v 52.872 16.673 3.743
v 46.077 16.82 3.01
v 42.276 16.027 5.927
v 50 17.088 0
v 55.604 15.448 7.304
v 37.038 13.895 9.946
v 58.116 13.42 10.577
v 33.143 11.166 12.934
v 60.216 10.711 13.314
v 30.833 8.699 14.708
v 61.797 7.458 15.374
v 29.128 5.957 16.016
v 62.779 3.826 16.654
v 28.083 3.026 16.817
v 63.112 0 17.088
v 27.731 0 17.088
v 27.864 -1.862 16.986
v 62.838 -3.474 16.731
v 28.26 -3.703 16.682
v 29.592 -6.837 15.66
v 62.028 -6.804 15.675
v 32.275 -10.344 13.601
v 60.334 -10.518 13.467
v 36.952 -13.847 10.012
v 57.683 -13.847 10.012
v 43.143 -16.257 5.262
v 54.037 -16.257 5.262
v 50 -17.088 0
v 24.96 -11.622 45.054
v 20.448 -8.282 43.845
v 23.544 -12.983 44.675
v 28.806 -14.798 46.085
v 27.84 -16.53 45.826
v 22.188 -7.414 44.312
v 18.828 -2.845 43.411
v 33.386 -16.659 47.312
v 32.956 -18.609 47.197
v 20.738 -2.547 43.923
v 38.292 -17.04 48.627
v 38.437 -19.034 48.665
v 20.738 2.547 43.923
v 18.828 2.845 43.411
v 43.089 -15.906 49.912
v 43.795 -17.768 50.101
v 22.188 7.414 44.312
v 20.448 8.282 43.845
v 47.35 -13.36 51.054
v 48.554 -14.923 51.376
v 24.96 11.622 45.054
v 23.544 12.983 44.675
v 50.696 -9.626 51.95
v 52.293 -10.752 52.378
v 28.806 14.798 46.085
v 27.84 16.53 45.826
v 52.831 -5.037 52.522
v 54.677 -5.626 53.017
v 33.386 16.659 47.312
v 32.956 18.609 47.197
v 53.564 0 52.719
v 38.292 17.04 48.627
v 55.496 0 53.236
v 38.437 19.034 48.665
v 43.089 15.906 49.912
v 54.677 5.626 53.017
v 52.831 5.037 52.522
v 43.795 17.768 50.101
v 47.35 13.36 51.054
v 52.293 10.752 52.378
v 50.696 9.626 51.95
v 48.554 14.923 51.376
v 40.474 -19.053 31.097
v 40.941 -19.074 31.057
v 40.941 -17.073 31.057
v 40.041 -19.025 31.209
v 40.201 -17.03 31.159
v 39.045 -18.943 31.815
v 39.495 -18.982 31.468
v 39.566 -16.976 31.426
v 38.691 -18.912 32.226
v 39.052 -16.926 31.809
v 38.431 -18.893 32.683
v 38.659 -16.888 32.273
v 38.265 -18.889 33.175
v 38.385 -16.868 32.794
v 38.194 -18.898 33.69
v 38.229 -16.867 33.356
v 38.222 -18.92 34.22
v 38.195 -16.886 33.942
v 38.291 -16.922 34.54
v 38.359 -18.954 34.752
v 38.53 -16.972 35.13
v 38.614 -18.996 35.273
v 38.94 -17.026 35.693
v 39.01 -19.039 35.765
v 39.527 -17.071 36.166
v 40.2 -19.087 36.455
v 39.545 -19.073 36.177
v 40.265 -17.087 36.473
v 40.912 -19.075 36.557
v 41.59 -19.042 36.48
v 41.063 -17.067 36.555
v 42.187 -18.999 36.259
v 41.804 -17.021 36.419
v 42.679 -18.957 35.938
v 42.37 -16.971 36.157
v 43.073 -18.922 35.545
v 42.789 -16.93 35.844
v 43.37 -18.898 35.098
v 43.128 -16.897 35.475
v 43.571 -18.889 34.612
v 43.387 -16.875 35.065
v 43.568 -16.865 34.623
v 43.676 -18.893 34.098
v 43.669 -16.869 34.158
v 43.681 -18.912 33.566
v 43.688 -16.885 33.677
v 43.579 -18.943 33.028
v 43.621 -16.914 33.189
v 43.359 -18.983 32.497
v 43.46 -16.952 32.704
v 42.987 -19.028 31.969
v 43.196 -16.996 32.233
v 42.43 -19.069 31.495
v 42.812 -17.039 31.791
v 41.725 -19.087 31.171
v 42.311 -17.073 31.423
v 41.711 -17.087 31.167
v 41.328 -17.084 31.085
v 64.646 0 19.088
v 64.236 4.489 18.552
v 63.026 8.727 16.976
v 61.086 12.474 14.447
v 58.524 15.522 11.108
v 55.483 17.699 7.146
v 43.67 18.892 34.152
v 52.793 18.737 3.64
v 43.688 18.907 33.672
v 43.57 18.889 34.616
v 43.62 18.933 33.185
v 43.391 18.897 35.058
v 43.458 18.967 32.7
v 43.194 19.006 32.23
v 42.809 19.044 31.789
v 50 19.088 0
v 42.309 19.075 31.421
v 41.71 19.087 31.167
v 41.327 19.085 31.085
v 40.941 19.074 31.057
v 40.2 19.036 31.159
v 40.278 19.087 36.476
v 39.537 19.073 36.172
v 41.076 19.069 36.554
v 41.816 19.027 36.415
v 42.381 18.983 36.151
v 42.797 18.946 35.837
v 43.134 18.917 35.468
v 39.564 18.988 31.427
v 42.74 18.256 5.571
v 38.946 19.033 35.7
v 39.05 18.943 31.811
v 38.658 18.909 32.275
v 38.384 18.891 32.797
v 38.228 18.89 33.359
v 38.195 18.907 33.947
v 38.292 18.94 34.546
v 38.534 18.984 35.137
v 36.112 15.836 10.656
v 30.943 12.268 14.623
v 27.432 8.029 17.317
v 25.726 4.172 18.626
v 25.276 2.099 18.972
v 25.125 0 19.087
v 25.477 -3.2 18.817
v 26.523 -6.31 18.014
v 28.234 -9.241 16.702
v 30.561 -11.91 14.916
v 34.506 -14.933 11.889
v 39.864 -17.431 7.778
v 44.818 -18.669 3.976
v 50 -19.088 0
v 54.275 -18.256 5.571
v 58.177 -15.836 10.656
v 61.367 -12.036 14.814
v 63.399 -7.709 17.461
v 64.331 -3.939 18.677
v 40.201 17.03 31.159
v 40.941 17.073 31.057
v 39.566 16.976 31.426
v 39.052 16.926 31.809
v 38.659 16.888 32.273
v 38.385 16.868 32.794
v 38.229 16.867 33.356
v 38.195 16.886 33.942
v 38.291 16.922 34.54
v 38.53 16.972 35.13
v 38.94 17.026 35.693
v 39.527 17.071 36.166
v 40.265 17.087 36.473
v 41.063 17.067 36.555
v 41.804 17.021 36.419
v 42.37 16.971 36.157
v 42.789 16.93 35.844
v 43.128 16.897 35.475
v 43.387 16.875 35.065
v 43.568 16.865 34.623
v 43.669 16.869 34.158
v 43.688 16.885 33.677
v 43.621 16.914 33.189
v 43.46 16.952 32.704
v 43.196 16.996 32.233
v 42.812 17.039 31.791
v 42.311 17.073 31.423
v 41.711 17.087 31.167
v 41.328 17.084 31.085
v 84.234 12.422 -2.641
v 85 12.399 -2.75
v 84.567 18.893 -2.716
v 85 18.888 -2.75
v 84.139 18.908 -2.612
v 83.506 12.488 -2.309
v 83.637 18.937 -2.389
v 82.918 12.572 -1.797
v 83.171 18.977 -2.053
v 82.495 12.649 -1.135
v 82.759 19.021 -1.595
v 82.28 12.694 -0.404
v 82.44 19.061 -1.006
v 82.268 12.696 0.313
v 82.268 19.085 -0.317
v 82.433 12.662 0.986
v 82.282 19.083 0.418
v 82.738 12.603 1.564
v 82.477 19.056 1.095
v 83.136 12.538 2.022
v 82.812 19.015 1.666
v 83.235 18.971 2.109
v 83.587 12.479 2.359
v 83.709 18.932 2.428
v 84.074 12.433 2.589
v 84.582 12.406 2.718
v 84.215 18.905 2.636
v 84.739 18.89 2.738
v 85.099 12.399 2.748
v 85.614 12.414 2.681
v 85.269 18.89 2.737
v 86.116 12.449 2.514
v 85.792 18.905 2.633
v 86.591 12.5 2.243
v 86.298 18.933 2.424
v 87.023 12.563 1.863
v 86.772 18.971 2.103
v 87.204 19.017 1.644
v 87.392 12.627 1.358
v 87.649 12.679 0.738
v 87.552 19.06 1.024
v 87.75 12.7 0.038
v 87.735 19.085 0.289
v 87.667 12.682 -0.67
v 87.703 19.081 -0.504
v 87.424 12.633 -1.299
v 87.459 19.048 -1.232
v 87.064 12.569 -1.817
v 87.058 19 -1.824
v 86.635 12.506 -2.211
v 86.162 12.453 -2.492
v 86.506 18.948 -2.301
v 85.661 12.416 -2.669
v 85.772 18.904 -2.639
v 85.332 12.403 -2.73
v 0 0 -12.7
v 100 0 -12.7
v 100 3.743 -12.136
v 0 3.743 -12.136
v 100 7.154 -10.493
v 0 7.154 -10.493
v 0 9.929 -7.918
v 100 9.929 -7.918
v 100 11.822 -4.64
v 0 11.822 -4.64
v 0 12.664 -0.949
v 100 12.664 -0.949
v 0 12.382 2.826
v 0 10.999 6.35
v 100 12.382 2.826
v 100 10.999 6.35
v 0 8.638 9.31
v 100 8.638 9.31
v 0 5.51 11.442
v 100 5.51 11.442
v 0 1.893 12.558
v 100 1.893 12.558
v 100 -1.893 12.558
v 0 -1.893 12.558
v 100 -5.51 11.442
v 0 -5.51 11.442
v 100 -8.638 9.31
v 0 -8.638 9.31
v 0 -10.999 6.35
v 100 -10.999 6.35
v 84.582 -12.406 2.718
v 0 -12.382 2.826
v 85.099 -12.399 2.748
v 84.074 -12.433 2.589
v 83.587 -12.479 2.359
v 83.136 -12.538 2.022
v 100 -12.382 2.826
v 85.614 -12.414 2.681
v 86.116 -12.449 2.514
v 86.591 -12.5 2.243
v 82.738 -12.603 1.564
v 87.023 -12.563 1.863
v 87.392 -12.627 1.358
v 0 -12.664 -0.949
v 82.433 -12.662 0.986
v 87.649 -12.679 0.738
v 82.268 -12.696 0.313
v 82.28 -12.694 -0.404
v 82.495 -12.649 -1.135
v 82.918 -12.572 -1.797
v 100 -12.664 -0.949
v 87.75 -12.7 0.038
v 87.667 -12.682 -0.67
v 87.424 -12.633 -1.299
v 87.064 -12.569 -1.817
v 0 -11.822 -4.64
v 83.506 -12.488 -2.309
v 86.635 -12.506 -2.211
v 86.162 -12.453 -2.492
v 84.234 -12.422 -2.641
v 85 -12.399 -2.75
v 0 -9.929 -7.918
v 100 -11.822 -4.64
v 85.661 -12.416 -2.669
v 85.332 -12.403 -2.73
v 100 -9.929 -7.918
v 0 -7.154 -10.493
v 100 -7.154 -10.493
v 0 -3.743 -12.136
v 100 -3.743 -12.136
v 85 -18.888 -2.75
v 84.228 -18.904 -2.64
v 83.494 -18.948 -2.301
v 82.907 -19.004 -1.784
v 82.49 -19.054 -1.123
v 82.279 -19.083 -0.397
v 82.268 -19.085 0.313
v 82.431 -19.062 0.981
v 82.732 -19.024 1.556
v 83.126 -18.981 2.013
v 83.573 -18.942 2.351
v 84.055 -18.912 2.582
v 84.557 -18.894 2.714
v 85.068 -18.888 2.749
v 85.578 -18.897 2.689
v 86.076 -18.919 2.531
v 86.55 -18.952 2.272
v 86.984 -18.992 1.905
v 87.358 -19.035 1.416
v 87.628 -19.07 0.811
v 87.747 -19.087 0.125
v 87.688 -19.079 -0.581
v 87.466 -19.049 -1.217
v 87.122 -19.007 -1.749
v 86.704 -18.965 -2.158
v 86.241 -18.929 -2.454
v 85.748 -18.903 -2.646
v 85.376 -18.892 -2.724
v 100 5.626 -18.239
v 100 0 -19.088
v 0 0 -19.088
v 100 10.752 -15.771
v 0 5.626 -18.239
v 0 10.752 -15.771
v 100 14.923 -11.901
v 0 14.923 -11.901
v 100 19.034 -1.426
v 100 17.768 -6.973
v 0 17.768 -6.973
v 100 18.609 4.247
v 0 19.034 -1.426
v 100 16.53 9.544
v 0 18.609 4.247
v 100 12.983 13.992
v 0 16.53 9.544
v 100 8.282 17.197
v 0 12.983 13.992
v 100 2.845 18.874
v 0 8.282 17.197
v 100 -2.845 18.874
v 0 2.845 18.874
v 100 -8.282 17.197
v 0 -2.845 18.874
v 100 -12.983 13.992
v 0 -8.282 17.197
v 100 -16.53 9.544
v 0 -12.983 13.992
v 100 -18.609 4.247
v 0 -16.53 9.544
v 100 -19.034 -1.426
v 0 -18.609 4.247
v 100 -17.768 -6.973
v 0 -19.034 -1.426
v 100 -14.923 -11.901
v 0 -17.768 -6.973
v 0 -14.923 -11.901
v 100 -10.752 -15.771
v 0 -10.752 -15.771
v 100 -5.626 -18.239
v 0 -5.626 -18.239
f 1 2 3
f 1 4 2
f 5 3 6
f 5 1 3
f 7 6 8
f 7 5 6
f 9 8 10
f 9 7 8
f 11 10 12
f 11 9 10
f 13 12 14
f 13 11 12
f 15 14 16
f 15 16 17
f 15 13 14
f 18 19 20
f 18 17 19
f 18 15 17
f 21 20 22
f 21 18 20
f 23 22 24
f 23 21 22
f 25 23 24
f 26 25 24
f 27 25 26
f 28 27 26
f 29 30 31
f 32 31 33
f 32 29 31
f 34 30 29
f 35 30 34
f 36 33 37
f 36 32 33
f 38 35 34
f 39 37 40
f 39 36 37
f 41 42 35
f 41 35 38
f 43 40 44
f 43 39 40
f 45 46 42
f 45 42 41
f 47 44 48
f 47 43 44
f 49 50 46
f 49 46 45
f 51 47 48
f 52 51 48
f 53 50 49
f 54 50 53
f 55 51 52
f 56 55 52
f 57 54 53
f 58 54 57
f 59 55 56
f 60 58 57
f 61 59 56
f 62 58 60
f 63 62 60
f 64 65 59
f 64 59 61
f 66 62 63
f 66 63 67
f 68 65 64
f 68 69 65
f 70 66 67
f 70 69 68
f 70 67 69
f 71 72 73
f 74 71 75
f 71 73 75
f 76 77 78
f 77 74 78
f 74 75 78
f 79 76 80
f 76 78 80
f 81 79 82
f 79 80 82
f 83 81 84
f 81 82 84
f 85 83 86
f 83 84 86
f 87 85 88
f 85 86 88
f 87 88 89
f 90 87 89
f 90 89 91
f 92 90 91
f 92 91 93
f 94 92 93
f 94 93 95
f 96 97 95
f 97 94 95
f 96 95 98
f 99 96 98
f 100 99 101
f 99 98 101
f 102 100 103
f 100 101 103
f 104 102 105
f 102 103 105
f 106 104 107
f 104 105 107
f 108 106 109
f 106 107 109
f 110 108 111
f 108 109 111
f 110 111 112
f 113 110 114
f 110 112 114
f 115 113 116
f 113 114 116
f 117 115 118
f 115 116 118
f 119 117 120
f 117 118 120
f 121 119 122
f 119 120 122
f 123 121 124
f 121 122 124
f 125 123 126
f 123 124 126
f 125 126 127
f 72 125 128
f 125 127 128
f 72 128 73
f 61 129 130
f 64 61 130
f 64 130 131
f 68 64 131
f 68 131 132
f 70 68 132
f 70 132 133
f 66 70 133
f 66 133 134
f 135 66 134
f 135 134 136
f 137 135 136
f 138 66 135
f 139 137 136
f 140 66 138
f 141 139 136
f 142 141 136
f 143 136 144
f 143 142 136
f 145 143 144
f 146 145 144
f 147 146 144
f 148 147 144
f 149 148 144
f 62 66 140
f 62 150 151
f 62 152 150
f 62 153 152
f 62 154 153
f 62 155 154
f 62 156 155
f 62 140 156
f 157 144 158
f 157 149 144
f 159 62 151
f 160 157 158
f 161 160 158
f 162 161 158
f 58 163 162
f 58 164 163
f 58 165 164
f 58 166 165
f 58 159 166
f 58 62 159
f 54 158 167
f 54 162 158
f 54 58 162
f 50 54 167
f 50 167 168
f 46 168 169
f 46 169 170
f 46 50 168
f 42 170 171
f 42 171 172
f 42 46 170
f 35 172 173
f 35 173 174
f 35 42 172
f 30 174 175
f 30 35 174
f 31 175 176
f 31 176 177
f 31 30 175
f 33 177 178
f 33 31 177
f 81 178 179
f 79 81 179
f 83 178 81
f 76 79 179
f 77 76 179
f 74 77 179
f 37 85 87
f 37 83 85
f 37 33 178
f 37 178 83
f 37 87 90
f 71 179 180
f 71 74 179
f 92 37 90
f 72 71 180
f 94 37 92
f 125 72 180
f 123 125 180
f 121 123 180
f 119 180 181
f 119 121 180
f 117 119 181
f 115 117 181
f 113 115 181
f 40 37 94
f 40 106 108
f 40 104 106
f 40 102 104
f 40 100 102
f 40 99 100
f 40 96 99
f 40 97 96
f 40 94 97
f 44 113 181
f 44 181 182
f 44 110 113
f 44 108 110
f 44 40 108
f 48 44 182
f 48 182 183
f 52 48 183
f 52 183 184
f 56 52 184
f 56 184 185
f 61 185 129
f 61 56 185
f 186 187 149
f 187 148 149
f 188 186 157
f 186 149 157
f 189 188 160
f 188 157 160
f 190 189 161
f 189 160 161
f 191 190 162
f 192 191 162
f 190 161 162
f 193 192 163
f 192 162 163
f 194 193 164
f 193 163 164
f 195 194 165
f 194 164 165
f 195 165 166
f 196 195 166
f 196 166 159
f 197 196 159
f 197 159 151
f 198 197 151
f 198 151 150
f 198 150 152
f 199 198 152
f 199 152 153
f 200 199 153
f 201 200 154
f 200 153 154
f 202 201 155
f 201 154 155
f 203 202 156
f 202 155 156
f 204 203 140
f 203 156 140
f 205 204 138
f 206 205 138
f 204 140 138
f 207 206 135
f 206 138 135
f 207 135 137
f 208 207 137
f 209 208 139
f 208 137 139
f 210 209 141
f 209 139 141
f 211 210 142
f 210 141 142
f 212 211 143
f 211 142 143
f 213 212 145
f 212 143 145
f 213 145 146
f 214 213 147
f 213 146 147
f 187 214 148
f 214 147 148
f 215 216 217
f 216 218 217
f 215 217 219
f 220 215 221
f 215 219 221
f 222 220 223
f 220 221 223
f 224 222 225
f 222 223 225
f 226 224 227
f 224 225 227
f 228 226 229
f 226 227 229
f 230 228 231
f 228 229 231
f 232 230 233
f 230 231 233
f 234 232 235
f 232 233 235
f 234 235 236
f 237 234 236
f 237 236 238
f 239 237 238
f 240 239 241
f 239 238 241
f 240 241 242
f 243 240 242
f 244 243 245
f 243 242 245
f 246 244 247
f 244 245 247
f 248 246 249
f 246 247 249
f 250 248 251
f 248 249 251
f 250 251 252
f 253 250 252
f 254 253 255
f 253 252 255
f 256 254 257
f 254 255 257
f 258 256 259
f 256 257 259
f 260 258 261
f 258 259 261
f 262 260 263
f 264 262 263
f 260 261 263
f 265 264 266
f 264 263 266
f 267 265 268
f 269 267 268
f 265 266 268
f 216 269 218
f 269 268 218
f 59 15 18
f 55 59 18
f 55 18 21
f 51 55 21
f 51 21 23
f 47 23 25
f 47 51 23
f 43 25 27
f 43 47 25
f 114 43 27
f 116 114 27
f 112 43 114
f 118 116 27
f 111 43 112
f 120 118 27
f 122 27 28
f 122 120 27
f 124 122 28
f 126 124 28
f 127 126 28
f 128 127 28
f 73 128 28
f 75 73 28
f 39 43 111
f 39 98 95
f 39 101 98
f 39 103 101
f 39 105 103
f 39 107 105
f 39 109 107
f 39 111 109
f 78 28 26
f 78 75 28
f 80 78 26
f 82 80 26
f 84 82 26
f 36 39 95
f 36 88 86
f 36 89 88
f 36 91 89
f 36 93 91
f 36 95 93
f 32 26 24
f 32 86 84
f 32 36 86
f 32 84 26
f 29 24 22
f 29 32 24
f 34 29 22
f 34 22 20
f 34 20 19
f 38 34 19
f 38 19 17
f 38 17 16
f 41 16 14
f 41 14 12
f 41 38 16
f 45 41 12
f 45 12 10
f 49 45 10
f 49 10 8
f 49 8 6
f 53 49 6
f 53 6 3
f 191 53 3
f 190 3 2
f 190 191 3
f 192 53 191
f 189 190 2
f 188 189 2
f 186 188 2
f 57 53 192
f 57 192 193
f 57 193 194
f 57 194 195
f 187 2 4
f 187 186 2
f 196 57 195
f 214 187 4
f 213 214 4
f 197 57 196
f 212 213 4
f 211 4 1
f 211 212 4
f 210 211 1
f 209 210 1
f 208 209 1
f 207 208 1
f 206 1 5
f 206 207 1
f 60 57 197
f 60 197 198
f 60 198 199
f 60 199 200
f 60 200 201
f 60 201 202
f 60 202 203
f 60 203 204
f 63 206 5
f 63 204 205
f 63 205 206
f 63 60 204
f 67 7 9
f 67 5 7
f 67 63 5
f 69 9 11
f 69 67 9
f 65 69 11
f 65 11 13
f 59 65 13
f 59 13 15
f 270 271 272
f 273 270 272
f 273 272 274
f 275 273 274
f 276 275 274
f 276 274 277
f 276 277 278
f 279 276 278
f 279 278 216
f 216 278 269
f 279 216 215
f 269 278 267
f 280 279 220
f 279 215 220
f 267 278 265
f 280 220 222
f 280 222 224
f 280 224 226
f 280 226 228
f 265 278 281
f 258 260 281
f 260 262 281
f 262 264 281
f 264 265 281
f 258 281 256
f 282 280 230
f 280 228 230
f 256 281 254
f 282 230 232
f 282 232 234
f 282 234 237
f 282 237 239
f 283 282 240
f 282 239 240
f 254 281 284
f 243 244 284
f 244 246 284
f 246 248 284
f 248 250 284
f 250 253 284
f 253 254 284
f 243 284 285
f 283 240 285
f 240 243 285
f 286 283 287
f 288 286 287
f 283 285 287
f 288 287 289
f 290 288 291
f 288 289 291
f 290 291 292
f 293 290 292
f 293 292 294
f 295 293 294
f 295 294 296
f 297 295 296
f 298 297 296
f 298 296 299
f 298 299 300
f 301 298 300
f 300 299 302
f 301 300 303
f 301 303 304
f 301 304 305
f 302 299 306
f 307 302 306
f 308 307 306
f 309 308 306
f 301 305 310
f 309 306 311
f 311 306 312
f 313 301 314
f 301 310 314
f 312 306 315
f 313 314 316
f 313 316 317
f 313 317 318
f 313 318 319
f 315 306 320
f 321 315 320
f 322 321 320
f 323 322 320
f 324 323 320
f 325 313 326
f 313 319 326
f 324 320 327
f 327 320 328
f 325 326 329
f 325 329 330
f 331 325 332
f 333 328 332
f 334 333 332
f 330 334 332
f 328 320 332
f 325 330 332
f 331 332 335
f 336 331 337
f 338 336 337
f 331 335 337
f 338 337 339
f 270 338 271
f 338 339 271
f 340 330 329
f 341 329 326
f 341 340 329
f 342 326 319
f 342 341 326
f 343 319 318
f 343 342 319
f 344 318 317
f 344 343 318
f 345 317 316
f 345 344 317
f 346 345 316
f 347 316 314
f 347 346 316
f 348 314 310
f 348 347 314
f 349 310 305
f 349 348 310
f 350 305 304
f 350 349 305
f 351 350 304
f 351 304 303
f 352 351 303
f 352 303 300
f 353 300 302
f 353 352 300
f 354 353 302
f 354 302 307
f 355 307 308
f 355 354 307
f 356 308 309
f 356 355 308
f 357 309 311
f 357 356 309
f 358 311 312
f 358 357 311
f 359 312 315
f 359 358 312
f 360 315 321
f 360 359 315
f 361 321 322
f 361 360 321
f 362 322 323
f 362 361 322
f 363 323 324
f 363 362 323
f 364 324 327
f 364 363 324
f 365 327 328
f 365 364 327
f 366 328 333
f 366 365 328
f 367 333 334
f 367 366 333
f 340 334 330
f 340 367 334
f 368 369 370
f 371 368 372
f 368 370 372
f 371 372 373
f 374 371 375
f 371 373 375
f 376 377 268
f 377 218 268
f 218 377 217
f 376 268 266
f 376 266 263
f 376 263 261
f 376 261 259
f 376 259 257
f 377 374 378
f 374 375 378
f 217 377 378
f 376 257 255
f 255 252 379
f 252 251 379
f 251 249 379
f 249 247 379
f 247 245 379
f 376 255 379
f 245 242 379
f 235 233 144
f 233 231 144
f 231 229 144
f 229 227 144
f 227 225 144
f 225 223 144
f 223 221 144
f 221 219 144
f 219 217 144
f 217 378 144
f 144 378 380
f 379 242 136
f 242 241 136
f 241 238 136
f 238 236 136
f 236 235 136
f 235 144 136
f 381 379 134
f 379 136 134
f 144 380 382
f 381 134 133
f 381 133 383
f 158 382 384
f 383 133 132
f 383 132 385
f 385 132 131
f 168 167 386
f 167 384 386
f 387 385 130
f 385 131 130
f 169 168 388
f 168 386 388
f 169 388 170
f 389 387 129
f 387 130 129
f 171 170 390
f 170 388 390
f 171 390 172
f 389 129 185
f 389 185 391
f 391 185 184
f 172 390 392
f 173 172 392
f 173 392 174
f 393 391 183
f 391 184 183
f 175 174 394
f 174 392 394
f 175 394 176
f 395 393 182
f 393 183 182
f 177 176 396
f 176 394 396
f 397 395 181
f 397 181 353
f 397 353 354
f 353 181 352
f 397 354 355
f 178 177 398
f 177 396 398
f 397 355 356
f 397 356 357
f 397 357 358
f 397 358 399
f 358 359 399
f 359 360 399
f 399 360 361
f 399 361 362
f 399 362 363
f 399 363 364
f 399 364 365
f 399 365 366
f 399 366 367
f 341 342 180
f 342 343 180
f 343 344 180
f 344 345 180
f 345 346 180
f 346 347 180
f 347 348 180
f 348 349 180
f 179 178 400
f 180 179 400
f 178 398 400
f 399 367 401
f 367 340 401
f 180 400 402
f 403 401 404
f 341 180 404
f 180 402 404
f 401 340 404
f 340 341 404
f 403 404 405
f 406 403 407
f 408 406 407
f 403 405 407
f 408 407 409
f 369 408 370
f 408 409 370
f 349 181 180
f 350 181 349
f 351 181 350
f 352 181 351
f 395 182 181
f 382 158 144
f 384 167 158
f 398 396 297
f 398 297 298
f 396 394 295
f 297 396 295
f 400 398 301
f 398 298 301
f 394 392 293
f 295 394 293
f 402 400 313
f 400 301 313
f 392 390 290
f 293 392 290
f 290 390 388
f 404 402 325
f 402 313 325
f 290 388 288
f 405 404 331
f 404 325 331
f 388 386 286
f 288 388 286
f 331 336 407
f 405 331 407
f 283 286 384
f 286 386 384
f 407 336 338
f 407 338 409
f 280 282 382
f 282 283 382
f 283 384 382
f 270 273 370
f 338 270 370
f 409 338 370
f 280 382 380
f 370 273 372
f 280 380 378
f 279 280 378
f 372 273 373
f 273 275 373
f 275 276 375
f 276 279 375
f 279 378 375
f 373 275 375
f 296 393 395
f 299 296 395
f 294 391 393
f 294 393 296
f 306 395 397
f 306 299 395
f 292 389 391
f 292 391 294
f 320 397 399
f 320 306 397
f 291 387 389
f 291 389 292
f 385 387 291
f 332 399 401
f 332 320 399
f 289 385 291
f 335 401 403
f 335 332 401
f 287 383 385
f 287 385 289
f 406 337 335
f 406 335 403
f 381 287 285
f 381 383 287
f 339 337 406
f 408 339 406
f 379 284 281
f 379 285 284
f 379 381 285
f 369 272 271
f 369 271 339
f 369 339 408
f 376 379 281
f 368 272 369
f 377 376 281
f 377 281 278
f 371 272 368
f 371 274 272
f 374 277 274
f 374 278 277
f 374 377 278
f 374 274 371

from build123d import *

# Parameters (mm, degrees)
SKETCH2_R                     = 19.0875
BOSS_EXTRUDE1_DEPTH           = 100
BOSS_EXTRUDE2_REACH           = 96.162
BOSS_EXTRUDE2_END_RADIUS      = 19.0875
SKETCH3_R                     = 19.0875
SHELL1_OUTLINE_R              = 17.0875
SHELL1_DEPTH                  = 100
SHELL1_START                  = -37.059047745
SHELL1_2_OUTLINE_R            = 17.0875
SHELL1_2_DEPTH                = 50.0000001
SKETCH8_R                     = 17.0875
SKETCH8_R_2                   = 12.7
BOSS_EXTRUDE3_DEPTH           = 100
SKETCH6_W                     = 2.75
SKETCH6_H                     = 19.0875
M5_CLEARANCE_HOLE1_AT_2_COUNT = 2
M5_CLEARANCE_HOLE1_AT_2_PITCH = 55.53473382
MIRROR1_COPY_1_SKETCH_W       = 2.75
MIRROR1_COPY_1_SKETCH_H       = 19.0875


with BuildPart() as part:
    # Sketch2 → Boss-Extrude1 (new body)
    with BuildSketch(Plane(origin=(0, 0, 0), x_dir=(0, 0, -1), z_dir=(1, 0, 0))):
        Circle(SKETCH2_R)
    extrude(amount=BOSS_EXTRUDE1_DEPTH)

    # Boss-Extrude2: up to this cylinder (the profile starts outside it)
    boss_extrude2_end = Plane(origin=(37.059048, 0, 0), z_dir=(-1, 0, 0)) * Cylinder(BOSS_EXTRUDE2_END_RADIUS, 231.499, mode=Mode.PRIVATE)
    # Sketch3 → Boss-Extrude2 (add, up to the surface)
    with BuildSketch(Plane(origin=(37.059047745, 0, 48.296291314), x_dir=(0.9659258262890673, 0, 0.2588190451025246), z_dir=(-0.2588190451025246, 0, 0.9659258262890673)), mode=Mode.PRIVATE) as boss_extrude2_sk1:
        Circle(SKETCH3_R)
    boss_extrude2_tool1 = extrude(boss_extrude2_sk1.sketch, amount=-BOSS_EXTRUDE2_REACH, mode=Mode.PRIVATE) - boss_extrude2_end
    add(boss_extrude2_tool1.solids().sort_by_distance((37.059048, 0, 48.296291))[0])

    # Shell1: read off the stored shape, not the designer's step
    # Shell1 outline → Shell1 (cut)
    with BuildSketch(Plane.YZ):
        Circle(SHELL1_OUTLINE_R)
    extrude(amount=SHELL1_DEPTH, mode=Mode.SUBTRACT)

    # Shell1 2 outline → Shell1 2 (cut)
    with BuildSketch(Plane(origin=(0, 0, 0), x_dir=(0.9659258262890672, 0, 0.2588190451025251), z_dir=(0.25881904510252507, 0, -0.9659258262890672)).offset(SHELL1_START)):
        with Locations((48.296291314, 0)):
            Circle(SHELL1_2_OUTLINE_R)
    extrude(amount=SHELL1_2_DEPTH, mode=Mode.SUBTRACT)

    # Sketch8 → Boss-Extrude3 (add, through all)
    with BuildSketch(Plane(origin=(100, 0, 0), x_dir=(0, 0, -1), z_dir=(1, 0, 0))):
        Circle(SKETCH8_R)
        Circle(SKETCH8_R_2, mode=Mode.SUBTRACT)
    extrude(amount=-BOSS_EXTRUDE3_DEPTH)

    # Sketch6 → M5 Clearance Hole1 (revolve, cut)
    with BuildSketch(Plane(origin=(85, 0, 0), x_dir=(0, 0, -1), z_dir=(1, 0, 0))):
        with Locations((1.375, 9.54375)):
            Rectangle(SKETCH6_W, SKETCH6_H)
    m5_clearance_hole1 = revolve(axis=Axis((85, -6.35, 0), (0, 1, 0)), mode=Mode.SUBTRACT)

    # M5 Clearance Hole1 at 2: M5 Clearance Hole1 ×2
    with Locations(*[Vector(-0.7933533402912365, 0, 0.608761429008719) * (i * M5_CLEARANCE_HOLE1_AT_2_PITCH) for i in range(1, M5_CLEARANCE_HOLE1_AT_2_COUNT)]):
        add(m5_clearance_hole1, mode=Mode.SUBTRACT)

    # Mirror1: M5 Clearance Hole1 across plane
    add(m5_clearance_hole1.mirror(Plane.ZX), mode=Mode.SUBTRACT)

    # Mirror1 copy 1 sketch → Mirror1 copy 1 (revolve, cut)
    with BuildSketch(Plane(origin=(40.941333421, 0, 33.80740392), x_dir=(0, 0, -1), z_dir=(1, 0, 0))):
        with Locations((1.375, -9.54375)):
            Rectangle(MIRROR1_COPY_1_SKETCH_W, MIRROR1_COPY_1_SKETCH_H)
    revolve(axis=Axis((40.941333421, 6.35, 33.80740392), (0, 1, 0)), mode=Mode.SUBTRACT)


solid = part.part
